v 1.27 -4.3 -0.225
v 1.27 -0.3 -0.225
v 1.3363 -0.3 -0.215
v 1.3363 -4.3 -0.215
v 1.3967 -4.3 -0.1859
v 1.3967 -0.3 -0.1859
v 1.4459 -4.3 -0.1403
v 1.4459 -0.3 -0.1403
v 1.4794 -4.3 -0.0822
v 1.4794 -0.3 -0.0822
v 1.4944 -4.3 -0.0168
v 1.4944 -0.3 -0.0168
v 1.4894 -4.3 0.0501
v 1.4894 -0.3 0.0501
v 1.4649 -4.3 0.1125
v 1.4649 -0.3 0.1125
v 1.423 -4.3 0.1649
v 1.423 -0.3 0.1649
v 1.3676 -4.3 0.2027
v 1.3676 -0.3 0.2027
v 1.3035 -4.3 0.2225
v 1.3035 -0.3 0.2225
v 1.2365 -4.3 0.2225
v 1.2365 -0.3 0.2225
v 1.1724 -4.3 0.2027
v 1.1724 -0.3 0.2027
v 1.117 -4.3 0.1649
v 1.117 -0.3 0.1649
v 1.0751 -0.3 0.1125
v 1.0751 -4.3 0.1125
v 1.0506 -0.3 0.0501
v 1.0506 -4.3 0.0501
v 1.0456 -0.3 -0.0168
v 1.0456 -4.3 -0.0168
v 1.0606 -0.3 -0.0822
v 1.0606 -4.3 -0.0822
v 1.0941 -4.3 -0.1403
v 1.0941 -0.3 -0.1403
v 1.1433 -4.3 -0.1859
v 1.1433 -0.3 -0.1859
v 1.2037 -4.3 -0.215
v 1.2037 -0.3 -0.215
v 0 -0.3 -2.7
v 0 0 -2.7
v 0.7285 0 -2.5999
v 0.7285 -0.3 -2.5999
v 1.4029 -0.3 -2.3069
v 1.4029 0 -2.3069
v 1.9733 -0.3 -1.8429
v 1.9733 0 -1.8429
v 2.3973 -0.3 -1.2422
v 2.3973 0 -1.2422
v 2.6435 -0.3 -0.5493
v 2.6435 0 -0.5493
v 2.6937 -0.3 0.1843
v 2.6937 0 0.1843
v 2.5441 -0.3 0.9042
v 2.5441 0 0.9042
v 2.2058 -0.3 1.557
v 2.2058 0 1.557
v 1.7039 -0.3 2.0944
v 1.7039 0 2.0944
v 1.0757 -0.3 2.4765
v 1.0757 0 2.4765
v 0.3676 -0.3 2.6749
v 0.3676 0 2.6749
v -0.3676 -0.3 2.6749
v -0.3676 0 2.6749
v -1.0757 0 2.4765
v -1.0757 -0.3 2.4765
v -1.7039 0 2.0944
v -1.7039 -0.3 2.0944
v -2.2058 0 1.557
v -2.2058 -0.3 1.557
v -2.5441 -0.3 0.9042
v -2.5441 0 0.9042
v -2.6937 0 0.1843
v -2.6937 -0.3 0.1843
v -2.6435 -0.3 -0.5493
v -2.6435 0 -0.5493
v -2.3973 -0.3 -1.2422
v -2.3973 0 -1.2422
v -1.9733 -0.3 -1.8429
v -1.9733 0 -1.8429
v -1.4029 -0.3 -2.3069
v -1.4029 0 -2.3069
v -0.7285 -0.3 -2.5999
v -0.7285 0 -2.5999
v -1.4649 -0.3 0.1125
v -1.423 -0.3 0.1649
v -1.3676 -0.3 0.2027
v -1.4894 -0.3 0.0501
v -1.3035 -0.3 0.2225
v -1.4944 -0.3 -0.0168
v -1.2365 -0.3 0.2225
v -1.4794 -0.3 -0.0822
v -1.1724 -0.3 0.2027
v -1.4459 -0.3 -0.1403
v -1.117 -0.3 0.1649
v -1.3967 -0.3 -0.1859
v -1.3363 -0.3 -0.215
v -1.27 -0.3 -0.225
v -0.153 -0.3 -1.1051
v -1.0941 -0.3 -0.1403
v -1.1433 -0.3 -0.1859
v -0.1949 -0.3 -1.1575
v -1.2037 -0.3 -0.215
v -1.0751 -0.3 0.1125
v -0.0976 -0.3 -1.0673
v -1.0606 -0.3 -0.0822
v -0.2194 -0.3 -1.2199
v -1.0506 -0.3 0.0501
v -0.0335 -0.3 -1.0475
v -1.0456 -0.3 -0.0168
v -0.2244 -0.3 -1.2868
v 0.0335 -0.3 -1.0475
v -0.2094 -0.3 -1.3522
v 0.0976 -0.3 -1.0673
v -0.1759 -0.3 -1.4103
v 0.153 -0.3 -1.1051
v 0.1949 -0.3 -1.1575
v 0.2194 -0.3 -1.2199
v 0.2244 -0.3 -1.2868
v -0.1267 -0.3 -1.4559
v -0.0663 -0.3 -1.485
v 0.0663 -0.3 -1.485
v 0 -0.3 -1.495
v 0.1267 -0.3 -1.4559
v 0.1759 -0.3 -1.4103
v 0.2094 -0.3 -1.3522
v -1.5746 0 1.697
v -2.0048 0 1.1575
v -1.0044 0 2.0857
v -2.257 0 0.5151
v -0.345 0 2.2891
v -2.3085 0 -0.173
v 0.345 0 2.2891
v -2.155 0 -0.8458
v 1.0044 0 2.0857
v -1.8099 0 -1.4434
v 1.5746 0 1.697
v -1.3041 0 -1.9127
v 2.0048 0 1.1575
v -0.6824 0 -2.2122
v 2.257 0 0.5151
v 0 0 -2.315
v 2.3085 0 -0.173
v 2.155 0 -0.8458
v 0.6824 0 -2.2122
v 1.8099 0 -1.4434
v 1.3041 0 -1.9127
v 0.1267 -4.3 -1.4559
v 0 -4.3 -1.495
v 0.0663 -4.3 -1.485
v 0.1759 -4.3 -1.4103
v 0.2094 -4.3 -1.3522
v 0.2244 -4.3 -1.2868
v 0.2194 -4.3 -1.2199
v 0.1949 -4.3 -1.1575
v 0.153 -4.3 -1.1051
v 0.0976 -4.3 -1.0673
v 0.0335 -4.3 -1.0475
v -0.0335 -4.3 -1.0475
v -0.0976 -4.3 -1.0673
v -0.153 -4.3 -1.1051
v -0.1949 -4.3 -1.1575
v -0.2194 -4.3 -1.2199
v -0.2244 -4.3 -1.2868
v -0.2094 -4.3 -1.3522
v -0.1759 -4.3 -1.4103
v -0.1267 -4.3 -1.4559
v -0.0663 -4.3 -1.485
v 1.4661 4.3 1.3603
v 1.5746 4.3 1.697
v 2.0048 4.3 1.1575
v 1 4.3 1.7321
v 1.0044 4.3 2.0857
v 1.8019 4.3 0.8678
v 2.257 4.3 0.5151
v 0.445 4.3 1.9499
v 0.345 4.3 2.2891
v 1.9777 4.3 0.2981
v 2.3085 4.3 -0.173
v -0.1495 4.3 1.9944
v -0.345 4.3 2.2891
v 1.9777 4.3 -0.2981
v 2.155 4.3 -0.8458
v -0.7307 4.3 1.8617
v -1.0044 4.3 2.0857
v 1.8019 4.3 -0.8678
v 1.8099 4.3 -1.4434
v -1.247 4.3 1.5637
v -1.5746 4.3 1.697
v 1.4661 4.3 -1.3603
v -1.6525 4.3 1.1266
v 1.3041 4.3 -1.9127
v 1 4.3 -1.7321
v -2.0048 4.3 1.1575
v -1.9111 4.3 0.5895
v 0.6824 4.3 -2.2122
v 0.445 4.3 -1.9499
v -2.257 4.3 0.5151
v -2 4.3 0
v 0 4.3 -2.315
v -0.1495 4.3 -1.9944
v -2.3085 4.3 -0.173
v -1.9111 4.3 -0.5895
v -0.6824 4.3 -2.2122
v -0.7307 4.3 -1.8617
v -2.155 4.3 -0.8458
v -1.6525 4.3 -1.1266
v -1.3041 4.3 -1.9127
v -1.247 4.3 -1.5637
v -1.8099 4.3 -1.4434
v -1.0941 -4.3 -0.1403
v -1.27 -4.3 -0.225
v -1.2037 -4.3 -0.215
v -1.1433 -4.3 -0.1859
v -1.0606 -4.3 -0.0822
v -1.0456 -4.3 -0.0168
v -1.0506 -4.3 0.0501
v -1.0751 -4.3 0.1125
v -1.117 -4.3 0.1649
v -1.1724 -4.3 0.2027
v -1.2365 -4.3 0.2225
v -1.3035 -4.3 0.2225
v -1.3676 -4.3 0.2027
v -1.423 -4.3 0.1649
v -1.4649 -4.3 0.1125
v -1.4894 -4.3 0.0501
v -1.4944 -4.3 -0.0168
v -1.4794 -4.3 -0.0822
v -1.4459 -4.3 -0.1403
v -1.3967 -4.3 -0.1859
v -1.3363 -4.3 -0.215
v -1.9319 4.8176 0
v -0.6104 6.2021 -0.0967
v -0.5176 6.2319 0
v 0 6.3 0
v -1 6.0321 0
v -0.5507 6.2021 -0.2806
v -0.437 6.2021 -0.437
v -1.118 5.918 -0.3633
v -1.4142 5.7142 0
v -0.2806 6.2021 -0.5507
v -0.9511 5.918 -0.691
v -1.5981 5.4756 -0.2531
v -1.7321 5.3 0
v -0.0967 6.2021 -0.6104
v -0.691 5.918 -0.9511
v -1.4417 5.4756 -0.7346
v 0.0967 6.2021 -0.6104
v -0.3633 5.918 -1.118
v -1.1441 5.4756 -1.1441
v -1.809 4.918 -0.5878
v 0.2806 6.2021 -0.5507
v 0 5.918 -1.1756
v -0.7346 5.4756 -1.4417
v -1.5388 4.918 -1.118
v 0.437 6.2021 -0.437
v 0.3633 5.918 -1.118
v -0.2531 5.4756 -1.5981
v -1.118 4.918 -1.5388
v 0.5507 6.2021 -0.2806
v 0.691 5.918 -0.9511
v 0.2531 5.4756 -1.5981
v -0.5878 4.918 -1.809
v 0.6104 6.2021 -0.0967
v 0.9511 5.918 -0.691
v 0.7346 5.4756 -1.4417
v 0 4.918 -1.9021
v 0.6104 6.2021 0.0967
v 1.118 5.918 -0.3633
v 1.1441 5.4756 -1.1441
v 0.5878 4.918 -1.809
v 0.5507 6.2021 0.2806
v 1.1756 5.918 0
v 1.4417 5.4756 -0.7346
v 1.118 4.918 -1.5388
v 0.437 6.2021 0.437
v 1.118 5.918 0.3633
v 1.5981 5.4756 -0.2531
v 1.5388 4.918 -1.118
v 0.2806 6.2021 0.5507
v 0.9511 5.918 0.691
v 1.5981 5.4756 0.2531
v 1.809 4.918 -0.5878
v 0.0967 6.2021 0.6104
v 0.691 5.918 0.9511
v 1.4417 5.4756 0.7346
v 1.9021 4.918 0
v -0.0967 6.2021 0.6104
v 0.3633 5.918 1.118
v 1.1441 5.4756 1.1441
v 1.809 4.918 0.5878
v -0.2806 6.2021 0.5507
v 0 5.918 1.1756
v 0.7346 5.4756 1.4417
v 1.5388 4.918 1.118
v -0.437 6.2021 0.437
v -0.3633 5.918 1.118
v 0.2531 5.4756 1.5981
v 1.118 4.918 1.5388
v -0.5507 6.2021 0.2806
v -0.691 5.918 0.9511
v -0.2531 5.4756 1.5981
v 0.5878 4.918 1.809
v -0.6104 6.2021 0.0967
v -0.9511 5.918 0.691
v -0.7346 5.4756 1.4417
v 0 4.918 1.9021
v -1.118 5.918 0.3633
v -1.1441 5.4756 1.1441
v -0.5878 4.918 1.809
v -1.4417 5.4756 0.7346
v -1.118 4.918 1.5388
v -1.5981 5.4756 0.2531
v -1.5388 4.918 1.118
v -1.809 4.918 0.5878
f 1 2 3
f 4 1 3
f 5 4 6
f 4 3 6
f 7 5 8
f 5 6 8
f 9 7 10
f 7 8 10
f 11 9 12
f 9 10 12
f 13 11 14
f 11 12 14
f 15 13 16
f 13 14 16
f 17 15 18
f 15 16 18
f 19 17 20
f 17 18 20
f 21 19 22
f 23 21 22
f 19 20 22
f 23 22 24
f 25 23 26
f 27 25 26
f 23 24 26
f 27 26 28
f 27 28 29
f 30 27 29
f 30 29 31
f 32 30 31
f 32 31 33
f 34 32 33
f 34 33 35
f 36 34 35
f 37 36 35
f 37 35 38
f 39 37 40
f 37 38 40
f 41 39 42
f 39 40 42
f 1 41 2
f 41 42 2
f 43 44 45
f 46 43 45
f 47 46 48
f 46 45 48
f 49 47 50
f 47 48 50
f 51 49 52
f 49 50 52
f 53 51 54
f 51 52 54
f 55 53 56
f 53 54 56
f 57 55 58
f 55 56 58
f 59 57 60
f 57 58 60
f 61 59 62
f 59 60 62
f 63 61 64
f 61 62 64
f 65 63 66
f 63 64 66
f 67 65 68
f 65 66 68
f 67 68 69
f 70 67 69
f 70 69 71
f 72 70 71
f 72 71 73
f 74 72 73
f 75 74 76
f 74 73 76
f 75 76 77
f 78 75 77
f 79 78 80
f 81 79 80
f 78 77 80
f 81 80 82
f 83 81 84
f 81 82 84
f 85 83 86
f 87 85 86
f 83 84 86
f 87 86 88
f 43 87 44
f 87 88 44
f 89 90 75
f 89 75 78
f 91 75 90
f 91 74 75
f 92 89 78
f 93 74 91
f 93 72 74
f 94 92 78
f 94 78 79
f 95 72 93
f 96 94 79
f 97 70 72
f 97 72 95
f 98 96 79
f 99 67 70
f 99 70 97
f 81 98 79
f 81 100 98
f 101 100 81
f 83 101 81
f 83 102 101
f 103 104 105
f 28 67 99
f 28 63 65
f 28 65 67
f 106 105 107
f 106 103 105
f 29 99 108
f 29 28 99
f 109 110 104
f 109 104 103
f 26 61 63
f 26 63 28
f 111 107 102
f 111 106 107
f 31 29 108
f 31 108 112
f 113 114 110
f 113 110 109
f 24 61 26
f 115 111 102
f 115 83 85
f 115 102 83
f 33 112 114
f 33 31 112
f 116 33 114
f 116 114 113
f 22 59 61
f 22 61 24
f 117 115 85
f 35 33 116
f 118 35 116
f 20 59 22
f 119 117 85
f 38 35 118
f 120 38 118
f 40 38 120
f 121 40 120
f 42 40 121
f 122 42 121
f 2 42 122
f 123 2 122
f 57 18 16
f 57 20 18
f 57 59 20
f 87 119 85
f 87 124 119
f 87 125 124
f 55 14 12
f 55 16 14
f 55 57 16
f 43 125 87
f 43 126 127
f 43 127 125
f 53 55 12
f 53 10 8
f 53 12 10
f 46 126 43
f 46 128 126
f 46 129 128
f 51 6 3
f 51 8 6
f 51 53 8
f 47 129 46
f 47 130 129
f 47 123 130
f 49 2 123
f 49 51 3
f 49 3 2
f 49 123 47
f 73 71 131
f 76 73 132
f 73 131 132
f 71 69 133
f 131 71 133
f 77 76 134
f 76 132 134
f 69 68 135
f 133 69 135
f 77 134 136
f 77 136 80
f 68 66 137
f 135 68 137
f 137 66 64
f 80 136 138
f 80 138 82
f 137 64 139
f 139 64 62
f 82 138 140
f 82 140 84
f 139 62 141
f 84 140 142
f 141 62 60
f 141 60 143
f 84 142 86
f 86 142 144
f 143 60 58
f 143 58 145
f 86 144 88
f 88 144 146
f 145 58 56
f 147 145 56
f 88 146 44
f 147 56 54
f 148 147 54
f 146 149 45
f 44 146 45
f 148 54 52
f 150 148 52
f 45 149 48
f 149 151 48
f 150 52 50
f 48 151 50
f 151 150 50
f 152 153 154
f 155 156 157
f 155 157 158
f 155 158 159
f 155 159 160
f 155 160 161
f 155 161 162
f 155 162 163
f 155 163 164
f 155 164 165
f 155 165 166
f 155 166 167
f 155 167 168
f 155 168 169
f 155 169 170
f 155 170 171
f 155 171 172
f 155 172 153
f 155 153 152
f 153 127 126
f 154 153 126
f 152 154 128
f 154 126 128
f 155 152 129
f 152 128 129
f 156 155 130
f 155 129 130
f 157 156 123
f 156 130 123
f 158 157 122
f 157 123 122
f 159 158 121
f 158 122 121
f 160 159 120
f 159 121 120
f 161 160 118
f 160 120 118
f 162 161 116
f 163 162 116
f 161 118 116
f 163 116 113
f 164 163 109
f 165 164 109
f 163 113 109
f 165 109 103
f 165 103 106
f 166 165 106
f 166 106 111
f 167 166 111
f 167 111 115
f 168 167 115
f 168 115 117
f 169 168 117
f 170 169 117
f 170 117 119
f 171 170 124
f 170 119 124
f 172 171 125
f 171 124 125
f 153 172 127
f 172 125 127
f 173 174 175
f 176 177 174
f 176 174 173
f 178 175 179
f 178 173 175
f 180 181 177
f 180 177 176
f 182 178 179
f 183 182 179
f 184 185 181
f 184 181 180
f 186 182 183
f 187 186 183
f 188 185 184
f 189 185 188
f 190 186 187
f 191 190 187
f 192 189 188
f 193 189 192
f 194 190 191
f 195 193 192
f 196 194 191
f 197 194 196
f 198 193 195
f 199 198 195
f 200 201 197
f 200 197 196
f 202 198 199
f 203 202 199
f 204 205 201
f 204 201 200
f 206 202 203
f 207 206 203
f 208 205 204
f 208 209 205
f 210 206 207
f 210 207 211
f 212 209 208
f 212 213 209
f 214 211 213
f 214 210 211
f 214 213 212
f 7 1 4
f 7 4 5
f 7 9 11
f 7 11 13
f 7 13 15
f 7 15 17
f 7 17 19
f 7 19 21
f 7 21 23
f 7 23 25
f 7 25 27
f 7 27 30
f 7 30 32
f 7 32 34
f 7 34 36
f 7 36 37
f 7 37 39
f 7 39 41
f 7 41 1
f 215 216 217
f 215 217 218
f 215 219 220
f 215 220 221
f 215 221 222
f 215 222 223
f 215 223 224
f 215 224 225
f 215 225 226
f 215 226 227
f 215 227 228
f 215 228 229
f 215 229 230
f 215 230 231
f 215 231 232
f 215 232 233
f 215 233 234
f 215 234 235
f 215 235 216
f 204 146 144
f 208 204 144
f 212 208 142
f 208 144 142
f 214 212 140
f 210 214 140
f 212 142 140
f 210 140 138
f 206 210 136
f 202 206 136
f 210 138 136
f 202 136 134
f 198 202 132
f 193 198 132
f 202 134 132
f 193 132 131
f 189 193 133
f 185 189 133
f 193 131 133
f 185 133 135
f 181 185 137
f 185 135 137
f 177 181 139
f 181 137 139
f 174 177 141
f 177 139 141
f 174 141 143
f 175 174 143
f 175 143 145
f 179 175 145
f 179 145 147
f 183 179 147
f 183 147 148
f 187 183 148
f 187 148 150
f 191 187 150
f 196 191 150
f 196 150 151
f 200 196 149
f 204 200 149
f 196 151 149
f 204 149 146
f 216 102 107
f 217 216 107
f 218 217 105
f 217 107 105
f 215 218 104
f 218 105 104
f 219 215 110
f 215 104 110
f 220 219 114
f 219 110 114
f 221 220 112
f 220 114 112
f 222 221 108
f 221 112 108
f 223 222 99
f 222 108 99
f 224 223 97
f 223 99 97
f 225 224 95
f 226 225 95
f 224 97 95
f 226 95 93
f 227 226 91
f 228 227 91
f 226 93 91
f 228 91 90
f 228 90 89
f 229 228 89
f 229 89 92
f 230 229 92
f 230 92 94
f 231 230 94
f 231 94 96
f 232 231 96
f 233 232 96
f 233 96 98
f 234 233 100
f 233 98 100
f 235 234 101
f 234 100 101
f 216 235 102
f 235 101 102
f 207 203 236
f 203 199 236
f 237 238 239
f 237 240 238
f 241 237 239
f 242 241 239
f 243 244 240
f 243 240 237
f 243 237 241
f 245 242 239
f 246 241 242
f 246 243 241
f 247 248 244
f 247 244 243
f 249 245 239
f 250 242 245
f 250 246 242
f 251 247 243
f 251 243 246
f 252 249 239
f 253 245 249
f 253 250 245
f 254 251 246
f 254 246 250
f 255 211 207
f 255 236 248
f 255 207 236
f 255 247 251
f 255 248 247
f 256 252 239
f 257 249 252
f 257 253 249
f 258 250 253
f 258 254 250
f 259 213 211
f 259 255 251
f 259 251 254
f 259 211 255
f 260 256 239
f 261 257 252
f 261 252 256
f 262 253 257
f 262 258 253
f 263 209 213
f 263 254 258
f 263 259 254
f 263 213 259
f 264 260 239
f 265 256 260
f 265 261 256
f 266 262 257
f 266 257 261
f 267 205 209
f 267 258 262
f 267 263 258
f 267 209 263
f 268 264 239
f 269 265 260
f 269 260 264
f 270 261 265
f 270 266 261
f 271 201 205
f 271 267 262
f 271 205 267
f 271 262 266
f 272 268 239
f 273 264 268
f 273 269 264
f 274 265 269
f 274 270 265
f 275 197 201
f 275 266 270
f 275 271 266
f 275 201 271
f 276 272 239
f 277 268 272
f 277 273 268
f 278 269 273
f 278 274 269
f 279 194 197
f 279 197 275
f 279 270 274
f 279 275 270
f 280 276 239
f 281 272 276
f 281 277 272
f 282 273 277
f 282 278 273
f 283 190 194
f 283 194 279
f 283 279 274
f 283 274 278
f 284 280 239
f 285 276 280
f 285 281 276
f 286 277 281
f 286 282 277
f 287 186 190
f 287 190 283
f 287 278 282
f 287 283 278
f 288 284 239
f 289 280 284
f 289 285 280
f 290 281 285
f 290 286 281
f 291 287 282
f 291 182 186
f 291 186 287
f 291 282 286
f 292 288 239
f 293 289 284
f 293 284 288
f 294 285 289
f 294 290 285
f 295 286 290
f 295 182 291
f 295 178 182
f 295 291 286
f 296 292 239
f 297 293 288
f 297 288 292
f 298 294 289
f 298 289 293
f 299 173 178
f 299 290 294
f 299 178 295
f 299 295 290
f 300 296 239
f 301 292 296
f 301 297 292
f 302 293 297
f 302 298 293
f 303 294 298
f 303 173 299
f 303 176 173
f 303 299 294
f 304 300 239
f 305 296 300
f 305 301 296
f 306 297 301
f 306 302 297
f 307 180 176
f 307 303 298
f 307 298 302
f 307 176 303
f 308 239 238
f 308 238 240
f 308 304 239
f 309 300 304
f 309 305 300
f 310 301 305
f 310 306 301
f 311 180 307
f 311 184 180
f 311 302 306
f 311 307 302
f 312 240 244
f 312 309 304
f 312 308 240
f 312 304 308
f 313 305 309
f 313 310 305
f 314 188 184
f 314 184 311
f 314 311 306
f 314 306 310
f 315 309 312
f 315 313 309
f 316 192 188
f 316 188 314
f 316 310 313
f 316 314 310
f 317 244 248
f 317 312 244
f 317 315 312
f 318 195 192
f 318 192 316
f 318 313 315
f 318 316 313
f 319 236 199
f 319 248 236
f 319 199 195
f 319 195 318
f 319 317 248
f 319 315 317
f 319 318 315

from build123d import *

# Parameters (mm, degrees)
SKETCH_1_R      = 2.315
EXTRUDE_1_DEPTH = 4.3
SKETCH_3_R      = 2.7
EXTRUDE_2_DEPTH = 0.3
SKETCH_5_R      = 0.225
EXTRUDE_3_DEPTH = 4


with BuildPart() as part:
    # 草图1 → 凸台-拉伸1 (new body)
    with BuildSketch(Plane(origin=(0, 0, 0), x_dir=(1, 0, 0), z_dir=(0, 1, 0))):
        with Locations(Location((0, 0, 0), (0, 0, 90))):
            Circle(SKETCH_1_R)
    extrude(amount=EXTRUDE_1_DEPTH)

    # 草图2 → 旋转2 (revolve)
    with BuildSketch(Plane.XY):
        with BuildLine():
            Line((-2, 4.3), (0, 4.3))
            Line((0, 4.3), (0, 6.3))
            ThreePointArc((0, 6.3), (-1.414213562, 5.714213562), (-2, 4.3))
        make_face()
    revolve(axis=Axis((0, 11.522957205, 0), (0, -1, 0)))

    # 草图3 → 凸台-拉伸2 (add)
    with BuildSketch(Plane.XZ):
        with Locations(Location((0, 0, 0), (0, 0, 270))):
            Circle(SKETCH_3_R)
    extrude(amount=EXTRUDE_2_DEPTH)

    # 草图5 → 凸台-拉伸3 (add)
    with BuildSketch(Plane.XZ.offset(0.3)):
        with Locations(Location((-1.27, 0, 0), (0, 0, 270))):
            Circle(SKETCH_5_R)
        with Locations(Location((1.27, 0, 0), (0, 0, 270))):
            Circle(SKETCH_5_R)
        with Locations(Location((0, -1.27, 0), (0, 0, 270))):
            Circle(SKETCH_5_R)
    extrude(amount=EXTRUDE_3_DEPTH)


solid = part.part
